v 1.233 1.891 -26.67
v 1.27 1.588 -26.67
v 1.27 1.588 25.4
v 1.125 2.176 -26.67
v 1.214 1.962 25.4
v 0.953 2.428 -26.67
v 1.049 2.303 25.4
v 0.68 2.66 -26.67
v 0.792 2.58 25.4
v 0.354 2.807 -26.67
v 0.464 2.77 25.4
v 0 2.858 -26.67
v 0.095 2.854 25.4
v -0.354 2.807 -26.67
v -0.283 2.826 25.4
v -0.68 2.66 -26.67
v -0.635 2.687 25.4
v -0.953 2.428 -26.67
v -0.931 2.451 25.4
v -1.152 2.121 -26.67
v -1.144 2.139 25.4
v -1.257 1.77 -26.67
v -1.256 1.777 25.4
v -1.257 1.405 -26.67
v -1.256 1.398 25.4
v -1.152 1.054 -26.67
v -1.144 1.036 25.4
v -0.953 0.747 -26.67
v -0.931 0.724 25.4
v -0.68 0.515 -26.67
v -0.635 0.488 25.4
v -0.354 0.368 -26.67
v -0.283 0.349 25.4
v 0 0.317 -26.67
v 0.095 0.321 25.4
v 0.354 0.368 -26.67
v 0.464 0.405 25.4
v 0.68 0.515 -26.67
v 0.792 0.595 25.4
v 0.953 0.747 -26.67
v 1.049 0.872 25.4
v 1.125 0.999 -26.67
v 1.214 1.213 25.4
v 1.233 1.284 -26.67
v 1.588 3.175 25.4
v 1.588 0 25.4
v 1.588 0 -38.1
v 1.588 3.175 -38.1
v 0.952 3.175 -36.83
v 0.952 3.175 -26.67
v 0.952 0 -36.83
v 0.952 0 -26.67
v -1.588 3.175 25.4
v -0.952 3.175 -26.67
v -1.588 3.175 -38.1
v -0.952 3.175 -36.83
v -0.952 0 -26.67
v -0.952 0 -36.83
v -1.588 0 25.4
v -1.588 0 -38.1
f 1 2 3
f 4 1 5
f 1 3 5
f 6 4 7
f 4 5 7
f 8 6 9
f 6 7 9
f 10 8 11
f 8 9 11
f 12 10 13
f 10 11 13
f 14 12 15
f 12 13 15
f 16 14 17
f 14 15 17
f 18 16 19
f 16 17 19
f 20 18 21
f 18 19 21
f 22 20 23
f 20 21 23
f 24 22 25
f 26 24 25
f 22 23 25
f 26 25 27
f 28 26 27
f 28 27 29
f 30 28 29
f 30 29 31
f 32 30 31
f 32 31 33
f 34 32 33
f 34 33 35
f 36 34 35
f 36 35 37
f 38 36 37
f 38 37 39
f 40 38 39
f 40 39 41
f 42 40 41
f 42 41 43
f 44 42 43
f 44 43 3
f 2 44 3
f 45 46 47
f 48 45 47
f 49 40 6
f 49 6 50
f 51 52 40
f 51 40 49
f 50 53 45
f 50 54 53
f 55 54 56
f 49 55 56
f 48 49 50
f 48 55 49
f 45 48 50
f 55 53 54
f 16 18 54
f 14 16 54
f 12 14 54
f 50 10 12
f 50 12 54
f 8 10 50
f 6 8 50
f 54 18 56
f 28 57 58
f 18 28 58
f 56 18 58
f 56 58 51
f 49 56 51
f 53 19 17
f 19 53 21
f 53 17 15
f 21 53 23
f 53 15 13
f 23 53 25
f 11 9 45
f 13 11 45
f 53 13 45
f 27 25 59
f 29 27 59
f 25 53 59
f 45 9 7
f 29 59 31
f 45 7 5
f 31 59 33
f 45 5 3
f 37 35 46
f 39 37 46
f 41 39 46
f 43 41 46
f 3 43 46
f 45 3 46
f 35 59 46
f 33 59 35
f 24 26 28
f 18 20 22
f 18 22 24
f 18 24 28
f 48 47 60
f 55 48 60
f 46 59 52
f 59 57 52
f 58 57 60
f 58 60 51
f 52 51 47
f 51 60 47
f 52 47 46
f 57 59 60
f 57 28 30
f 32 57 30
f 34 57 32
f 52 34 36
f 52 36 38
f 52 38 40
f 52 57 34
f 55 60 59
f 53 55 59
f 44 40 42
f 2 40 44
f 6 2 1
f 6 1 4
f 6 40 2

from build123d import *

# Parameters (mm, degrees)
SKETCH1_W           = 1.905
SKETCH1_H           = 10.16
BOSS_EXTRUDE2_DEPTH = 3.175
SKETCH2_R           = 1.27
CUT_EXTRUDE1_DEPTH  = 52.07


with BuildPart() as part:
    # Sketch1 → Boss-Extrude2 (new body)
    with BuildSketch(Plane(origin=(0, 0, 0), x_dir=(1, 0, 0), z_dir=(0, 1, 0))):
        Polygon((-1.5875, 25.4), (-1.5875, -25.4), (1.5875, -25.4), (1.5875, 25.4), (1.5875, 38.1), (-1.5875, 38.1), align=None)
        with Locations((0, 31.75)):
            Rectangle(SKETCH1_W, SKETCH1_H, mode=Mode.SUBTRACT)
    extrude(amount=BOSS_EXTRUDE2_DEPTH)

    # Sketch2 → Cut-Extrude1 (cut)
    with BuildSketch(Plane.XY.offset(25.4)):
        with Locations((0, 1.5875)):
            Circle(SKETCH2_R)
    extrude(amount=-CUT_EXTRUDE1_DEPTH, mode=Mode.SUBTRACT)


solid = part.part
